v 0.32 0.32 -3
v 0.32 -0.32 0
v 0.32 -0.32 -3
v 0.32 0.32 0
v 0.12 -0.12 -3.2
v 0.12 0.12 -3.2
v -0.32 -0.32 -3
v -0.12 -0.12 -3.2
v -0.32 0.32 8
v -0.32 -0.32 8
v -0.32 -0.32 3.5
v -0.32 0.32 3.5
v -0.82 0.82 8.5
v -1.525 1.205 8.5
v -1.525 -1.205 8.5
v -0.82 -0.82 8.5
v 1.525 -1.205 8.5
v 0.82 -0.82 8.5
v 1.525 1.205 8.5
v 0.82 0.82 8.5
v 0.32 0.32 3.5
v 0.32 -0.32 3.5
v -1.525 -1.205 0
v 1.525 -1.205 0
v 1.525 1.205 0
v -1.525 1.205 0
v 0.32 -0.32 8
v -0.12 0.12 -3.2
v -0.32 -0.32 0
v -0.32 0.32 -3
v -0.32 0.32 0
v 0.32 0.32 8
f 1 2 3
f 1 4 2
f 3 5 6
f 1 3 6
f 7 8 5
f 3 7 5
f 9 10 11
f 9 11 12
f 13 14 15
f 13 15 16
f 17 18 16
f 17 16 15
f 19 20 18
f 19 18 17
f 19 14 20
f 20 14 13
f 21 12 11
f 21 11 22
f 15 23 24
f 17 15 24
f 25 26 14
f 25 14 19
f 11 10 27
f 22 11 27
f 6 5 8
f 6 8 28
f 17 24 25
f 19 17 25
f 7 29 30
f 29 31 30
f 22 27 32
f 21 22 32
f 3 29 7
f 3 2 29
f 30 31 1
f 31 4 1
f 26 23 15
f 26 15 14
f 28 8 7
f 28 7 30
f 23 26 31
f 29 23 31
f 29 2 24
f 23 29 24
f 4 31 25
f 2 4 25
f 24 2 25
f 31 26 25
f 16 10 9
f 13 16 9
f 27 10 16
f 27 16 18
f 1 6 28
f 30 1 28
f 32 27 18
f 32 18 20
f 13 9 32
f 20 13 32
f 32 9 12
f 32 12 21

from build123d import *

# Parameters (mm, degrees)
SKETCH1_W           = 3.05
SKETCH1_H           = 2.41
BOSS_EXTRUDE1_DEPTH = 8.5
CUT_EXTRUDE1_START  = 8.5
SKETCH1_3_W         = 0.64
SKETCH1_3_H         = 0.64
CUT_EXTRUDE1_DEPTH  = 5
CHAMFER1_SIZE       = 0.5
SKETCH2_W           = 3.2
SKETCH2_H           = 0.64
BOSS_EXTRUDE2_DEPTH = 0.32
CHAMFER2_SIZE       = 0.2


with BuildPart() as part:
    # Sketch1 → Boss-Extrude1 (new body)
    with BuildSketch(Plane.XY):
        Rectangle(SKETCH1_W, SKETCH1_H)
    extrude(amount=BOSS_EXTRUDE1_DEPTH)

    # Sketch1<3> → Cut-Extrude1 (cut)
    with BuildSketch(Plane.XY.offset(CUT_EXTRUDE1_START)):
        Rectangle(SKETCH1_3_W, SKETCH1_3_H)
    extrude(amount=-CUT_EXTRUDE1_DEPTH, mode=Mode.SUBTRACT)

    # Chamfer1
    chamfer1_edges = [part.edges().sort_by_distance(p)[0] for p in [
        (-0.32, 0, 8.5),
        (0, -0.32, 8.5),
        (0.32, 0, 8.5),
        (0, 0.32, 8.5),
    ]]
    chamfer(chamfer1_edges, length=CHAMFER1_SIZE)

    # Sketch2 → Boss-Extrude2 (add, symmetric)
    with BuildSketch(Plane(origin=(0, 0, 0), x_dir=(0, 0, -1), z_dir=(1, 0, 0))):
        with Locations((1.6, 0)):
            Rectangle(SKETCH2_W, SKETCH2_H)
    extrude(amount=BOSS_EXTRUDE2_DEPTH, both=True)

    # Chamfer2
    chamfer2_edges = [part.edges().sort_by_distance(p)[0] for p in [
        (0.32, 0, -3.2),
        (0, -0.32, -3.2),
        (0, 0.32, -3.2),
        (-0.32, 0, -3.2),
    ]]
    chamfer(chamfer2_edges, length=CHAMFER2_SIZE)


solid = part.part
